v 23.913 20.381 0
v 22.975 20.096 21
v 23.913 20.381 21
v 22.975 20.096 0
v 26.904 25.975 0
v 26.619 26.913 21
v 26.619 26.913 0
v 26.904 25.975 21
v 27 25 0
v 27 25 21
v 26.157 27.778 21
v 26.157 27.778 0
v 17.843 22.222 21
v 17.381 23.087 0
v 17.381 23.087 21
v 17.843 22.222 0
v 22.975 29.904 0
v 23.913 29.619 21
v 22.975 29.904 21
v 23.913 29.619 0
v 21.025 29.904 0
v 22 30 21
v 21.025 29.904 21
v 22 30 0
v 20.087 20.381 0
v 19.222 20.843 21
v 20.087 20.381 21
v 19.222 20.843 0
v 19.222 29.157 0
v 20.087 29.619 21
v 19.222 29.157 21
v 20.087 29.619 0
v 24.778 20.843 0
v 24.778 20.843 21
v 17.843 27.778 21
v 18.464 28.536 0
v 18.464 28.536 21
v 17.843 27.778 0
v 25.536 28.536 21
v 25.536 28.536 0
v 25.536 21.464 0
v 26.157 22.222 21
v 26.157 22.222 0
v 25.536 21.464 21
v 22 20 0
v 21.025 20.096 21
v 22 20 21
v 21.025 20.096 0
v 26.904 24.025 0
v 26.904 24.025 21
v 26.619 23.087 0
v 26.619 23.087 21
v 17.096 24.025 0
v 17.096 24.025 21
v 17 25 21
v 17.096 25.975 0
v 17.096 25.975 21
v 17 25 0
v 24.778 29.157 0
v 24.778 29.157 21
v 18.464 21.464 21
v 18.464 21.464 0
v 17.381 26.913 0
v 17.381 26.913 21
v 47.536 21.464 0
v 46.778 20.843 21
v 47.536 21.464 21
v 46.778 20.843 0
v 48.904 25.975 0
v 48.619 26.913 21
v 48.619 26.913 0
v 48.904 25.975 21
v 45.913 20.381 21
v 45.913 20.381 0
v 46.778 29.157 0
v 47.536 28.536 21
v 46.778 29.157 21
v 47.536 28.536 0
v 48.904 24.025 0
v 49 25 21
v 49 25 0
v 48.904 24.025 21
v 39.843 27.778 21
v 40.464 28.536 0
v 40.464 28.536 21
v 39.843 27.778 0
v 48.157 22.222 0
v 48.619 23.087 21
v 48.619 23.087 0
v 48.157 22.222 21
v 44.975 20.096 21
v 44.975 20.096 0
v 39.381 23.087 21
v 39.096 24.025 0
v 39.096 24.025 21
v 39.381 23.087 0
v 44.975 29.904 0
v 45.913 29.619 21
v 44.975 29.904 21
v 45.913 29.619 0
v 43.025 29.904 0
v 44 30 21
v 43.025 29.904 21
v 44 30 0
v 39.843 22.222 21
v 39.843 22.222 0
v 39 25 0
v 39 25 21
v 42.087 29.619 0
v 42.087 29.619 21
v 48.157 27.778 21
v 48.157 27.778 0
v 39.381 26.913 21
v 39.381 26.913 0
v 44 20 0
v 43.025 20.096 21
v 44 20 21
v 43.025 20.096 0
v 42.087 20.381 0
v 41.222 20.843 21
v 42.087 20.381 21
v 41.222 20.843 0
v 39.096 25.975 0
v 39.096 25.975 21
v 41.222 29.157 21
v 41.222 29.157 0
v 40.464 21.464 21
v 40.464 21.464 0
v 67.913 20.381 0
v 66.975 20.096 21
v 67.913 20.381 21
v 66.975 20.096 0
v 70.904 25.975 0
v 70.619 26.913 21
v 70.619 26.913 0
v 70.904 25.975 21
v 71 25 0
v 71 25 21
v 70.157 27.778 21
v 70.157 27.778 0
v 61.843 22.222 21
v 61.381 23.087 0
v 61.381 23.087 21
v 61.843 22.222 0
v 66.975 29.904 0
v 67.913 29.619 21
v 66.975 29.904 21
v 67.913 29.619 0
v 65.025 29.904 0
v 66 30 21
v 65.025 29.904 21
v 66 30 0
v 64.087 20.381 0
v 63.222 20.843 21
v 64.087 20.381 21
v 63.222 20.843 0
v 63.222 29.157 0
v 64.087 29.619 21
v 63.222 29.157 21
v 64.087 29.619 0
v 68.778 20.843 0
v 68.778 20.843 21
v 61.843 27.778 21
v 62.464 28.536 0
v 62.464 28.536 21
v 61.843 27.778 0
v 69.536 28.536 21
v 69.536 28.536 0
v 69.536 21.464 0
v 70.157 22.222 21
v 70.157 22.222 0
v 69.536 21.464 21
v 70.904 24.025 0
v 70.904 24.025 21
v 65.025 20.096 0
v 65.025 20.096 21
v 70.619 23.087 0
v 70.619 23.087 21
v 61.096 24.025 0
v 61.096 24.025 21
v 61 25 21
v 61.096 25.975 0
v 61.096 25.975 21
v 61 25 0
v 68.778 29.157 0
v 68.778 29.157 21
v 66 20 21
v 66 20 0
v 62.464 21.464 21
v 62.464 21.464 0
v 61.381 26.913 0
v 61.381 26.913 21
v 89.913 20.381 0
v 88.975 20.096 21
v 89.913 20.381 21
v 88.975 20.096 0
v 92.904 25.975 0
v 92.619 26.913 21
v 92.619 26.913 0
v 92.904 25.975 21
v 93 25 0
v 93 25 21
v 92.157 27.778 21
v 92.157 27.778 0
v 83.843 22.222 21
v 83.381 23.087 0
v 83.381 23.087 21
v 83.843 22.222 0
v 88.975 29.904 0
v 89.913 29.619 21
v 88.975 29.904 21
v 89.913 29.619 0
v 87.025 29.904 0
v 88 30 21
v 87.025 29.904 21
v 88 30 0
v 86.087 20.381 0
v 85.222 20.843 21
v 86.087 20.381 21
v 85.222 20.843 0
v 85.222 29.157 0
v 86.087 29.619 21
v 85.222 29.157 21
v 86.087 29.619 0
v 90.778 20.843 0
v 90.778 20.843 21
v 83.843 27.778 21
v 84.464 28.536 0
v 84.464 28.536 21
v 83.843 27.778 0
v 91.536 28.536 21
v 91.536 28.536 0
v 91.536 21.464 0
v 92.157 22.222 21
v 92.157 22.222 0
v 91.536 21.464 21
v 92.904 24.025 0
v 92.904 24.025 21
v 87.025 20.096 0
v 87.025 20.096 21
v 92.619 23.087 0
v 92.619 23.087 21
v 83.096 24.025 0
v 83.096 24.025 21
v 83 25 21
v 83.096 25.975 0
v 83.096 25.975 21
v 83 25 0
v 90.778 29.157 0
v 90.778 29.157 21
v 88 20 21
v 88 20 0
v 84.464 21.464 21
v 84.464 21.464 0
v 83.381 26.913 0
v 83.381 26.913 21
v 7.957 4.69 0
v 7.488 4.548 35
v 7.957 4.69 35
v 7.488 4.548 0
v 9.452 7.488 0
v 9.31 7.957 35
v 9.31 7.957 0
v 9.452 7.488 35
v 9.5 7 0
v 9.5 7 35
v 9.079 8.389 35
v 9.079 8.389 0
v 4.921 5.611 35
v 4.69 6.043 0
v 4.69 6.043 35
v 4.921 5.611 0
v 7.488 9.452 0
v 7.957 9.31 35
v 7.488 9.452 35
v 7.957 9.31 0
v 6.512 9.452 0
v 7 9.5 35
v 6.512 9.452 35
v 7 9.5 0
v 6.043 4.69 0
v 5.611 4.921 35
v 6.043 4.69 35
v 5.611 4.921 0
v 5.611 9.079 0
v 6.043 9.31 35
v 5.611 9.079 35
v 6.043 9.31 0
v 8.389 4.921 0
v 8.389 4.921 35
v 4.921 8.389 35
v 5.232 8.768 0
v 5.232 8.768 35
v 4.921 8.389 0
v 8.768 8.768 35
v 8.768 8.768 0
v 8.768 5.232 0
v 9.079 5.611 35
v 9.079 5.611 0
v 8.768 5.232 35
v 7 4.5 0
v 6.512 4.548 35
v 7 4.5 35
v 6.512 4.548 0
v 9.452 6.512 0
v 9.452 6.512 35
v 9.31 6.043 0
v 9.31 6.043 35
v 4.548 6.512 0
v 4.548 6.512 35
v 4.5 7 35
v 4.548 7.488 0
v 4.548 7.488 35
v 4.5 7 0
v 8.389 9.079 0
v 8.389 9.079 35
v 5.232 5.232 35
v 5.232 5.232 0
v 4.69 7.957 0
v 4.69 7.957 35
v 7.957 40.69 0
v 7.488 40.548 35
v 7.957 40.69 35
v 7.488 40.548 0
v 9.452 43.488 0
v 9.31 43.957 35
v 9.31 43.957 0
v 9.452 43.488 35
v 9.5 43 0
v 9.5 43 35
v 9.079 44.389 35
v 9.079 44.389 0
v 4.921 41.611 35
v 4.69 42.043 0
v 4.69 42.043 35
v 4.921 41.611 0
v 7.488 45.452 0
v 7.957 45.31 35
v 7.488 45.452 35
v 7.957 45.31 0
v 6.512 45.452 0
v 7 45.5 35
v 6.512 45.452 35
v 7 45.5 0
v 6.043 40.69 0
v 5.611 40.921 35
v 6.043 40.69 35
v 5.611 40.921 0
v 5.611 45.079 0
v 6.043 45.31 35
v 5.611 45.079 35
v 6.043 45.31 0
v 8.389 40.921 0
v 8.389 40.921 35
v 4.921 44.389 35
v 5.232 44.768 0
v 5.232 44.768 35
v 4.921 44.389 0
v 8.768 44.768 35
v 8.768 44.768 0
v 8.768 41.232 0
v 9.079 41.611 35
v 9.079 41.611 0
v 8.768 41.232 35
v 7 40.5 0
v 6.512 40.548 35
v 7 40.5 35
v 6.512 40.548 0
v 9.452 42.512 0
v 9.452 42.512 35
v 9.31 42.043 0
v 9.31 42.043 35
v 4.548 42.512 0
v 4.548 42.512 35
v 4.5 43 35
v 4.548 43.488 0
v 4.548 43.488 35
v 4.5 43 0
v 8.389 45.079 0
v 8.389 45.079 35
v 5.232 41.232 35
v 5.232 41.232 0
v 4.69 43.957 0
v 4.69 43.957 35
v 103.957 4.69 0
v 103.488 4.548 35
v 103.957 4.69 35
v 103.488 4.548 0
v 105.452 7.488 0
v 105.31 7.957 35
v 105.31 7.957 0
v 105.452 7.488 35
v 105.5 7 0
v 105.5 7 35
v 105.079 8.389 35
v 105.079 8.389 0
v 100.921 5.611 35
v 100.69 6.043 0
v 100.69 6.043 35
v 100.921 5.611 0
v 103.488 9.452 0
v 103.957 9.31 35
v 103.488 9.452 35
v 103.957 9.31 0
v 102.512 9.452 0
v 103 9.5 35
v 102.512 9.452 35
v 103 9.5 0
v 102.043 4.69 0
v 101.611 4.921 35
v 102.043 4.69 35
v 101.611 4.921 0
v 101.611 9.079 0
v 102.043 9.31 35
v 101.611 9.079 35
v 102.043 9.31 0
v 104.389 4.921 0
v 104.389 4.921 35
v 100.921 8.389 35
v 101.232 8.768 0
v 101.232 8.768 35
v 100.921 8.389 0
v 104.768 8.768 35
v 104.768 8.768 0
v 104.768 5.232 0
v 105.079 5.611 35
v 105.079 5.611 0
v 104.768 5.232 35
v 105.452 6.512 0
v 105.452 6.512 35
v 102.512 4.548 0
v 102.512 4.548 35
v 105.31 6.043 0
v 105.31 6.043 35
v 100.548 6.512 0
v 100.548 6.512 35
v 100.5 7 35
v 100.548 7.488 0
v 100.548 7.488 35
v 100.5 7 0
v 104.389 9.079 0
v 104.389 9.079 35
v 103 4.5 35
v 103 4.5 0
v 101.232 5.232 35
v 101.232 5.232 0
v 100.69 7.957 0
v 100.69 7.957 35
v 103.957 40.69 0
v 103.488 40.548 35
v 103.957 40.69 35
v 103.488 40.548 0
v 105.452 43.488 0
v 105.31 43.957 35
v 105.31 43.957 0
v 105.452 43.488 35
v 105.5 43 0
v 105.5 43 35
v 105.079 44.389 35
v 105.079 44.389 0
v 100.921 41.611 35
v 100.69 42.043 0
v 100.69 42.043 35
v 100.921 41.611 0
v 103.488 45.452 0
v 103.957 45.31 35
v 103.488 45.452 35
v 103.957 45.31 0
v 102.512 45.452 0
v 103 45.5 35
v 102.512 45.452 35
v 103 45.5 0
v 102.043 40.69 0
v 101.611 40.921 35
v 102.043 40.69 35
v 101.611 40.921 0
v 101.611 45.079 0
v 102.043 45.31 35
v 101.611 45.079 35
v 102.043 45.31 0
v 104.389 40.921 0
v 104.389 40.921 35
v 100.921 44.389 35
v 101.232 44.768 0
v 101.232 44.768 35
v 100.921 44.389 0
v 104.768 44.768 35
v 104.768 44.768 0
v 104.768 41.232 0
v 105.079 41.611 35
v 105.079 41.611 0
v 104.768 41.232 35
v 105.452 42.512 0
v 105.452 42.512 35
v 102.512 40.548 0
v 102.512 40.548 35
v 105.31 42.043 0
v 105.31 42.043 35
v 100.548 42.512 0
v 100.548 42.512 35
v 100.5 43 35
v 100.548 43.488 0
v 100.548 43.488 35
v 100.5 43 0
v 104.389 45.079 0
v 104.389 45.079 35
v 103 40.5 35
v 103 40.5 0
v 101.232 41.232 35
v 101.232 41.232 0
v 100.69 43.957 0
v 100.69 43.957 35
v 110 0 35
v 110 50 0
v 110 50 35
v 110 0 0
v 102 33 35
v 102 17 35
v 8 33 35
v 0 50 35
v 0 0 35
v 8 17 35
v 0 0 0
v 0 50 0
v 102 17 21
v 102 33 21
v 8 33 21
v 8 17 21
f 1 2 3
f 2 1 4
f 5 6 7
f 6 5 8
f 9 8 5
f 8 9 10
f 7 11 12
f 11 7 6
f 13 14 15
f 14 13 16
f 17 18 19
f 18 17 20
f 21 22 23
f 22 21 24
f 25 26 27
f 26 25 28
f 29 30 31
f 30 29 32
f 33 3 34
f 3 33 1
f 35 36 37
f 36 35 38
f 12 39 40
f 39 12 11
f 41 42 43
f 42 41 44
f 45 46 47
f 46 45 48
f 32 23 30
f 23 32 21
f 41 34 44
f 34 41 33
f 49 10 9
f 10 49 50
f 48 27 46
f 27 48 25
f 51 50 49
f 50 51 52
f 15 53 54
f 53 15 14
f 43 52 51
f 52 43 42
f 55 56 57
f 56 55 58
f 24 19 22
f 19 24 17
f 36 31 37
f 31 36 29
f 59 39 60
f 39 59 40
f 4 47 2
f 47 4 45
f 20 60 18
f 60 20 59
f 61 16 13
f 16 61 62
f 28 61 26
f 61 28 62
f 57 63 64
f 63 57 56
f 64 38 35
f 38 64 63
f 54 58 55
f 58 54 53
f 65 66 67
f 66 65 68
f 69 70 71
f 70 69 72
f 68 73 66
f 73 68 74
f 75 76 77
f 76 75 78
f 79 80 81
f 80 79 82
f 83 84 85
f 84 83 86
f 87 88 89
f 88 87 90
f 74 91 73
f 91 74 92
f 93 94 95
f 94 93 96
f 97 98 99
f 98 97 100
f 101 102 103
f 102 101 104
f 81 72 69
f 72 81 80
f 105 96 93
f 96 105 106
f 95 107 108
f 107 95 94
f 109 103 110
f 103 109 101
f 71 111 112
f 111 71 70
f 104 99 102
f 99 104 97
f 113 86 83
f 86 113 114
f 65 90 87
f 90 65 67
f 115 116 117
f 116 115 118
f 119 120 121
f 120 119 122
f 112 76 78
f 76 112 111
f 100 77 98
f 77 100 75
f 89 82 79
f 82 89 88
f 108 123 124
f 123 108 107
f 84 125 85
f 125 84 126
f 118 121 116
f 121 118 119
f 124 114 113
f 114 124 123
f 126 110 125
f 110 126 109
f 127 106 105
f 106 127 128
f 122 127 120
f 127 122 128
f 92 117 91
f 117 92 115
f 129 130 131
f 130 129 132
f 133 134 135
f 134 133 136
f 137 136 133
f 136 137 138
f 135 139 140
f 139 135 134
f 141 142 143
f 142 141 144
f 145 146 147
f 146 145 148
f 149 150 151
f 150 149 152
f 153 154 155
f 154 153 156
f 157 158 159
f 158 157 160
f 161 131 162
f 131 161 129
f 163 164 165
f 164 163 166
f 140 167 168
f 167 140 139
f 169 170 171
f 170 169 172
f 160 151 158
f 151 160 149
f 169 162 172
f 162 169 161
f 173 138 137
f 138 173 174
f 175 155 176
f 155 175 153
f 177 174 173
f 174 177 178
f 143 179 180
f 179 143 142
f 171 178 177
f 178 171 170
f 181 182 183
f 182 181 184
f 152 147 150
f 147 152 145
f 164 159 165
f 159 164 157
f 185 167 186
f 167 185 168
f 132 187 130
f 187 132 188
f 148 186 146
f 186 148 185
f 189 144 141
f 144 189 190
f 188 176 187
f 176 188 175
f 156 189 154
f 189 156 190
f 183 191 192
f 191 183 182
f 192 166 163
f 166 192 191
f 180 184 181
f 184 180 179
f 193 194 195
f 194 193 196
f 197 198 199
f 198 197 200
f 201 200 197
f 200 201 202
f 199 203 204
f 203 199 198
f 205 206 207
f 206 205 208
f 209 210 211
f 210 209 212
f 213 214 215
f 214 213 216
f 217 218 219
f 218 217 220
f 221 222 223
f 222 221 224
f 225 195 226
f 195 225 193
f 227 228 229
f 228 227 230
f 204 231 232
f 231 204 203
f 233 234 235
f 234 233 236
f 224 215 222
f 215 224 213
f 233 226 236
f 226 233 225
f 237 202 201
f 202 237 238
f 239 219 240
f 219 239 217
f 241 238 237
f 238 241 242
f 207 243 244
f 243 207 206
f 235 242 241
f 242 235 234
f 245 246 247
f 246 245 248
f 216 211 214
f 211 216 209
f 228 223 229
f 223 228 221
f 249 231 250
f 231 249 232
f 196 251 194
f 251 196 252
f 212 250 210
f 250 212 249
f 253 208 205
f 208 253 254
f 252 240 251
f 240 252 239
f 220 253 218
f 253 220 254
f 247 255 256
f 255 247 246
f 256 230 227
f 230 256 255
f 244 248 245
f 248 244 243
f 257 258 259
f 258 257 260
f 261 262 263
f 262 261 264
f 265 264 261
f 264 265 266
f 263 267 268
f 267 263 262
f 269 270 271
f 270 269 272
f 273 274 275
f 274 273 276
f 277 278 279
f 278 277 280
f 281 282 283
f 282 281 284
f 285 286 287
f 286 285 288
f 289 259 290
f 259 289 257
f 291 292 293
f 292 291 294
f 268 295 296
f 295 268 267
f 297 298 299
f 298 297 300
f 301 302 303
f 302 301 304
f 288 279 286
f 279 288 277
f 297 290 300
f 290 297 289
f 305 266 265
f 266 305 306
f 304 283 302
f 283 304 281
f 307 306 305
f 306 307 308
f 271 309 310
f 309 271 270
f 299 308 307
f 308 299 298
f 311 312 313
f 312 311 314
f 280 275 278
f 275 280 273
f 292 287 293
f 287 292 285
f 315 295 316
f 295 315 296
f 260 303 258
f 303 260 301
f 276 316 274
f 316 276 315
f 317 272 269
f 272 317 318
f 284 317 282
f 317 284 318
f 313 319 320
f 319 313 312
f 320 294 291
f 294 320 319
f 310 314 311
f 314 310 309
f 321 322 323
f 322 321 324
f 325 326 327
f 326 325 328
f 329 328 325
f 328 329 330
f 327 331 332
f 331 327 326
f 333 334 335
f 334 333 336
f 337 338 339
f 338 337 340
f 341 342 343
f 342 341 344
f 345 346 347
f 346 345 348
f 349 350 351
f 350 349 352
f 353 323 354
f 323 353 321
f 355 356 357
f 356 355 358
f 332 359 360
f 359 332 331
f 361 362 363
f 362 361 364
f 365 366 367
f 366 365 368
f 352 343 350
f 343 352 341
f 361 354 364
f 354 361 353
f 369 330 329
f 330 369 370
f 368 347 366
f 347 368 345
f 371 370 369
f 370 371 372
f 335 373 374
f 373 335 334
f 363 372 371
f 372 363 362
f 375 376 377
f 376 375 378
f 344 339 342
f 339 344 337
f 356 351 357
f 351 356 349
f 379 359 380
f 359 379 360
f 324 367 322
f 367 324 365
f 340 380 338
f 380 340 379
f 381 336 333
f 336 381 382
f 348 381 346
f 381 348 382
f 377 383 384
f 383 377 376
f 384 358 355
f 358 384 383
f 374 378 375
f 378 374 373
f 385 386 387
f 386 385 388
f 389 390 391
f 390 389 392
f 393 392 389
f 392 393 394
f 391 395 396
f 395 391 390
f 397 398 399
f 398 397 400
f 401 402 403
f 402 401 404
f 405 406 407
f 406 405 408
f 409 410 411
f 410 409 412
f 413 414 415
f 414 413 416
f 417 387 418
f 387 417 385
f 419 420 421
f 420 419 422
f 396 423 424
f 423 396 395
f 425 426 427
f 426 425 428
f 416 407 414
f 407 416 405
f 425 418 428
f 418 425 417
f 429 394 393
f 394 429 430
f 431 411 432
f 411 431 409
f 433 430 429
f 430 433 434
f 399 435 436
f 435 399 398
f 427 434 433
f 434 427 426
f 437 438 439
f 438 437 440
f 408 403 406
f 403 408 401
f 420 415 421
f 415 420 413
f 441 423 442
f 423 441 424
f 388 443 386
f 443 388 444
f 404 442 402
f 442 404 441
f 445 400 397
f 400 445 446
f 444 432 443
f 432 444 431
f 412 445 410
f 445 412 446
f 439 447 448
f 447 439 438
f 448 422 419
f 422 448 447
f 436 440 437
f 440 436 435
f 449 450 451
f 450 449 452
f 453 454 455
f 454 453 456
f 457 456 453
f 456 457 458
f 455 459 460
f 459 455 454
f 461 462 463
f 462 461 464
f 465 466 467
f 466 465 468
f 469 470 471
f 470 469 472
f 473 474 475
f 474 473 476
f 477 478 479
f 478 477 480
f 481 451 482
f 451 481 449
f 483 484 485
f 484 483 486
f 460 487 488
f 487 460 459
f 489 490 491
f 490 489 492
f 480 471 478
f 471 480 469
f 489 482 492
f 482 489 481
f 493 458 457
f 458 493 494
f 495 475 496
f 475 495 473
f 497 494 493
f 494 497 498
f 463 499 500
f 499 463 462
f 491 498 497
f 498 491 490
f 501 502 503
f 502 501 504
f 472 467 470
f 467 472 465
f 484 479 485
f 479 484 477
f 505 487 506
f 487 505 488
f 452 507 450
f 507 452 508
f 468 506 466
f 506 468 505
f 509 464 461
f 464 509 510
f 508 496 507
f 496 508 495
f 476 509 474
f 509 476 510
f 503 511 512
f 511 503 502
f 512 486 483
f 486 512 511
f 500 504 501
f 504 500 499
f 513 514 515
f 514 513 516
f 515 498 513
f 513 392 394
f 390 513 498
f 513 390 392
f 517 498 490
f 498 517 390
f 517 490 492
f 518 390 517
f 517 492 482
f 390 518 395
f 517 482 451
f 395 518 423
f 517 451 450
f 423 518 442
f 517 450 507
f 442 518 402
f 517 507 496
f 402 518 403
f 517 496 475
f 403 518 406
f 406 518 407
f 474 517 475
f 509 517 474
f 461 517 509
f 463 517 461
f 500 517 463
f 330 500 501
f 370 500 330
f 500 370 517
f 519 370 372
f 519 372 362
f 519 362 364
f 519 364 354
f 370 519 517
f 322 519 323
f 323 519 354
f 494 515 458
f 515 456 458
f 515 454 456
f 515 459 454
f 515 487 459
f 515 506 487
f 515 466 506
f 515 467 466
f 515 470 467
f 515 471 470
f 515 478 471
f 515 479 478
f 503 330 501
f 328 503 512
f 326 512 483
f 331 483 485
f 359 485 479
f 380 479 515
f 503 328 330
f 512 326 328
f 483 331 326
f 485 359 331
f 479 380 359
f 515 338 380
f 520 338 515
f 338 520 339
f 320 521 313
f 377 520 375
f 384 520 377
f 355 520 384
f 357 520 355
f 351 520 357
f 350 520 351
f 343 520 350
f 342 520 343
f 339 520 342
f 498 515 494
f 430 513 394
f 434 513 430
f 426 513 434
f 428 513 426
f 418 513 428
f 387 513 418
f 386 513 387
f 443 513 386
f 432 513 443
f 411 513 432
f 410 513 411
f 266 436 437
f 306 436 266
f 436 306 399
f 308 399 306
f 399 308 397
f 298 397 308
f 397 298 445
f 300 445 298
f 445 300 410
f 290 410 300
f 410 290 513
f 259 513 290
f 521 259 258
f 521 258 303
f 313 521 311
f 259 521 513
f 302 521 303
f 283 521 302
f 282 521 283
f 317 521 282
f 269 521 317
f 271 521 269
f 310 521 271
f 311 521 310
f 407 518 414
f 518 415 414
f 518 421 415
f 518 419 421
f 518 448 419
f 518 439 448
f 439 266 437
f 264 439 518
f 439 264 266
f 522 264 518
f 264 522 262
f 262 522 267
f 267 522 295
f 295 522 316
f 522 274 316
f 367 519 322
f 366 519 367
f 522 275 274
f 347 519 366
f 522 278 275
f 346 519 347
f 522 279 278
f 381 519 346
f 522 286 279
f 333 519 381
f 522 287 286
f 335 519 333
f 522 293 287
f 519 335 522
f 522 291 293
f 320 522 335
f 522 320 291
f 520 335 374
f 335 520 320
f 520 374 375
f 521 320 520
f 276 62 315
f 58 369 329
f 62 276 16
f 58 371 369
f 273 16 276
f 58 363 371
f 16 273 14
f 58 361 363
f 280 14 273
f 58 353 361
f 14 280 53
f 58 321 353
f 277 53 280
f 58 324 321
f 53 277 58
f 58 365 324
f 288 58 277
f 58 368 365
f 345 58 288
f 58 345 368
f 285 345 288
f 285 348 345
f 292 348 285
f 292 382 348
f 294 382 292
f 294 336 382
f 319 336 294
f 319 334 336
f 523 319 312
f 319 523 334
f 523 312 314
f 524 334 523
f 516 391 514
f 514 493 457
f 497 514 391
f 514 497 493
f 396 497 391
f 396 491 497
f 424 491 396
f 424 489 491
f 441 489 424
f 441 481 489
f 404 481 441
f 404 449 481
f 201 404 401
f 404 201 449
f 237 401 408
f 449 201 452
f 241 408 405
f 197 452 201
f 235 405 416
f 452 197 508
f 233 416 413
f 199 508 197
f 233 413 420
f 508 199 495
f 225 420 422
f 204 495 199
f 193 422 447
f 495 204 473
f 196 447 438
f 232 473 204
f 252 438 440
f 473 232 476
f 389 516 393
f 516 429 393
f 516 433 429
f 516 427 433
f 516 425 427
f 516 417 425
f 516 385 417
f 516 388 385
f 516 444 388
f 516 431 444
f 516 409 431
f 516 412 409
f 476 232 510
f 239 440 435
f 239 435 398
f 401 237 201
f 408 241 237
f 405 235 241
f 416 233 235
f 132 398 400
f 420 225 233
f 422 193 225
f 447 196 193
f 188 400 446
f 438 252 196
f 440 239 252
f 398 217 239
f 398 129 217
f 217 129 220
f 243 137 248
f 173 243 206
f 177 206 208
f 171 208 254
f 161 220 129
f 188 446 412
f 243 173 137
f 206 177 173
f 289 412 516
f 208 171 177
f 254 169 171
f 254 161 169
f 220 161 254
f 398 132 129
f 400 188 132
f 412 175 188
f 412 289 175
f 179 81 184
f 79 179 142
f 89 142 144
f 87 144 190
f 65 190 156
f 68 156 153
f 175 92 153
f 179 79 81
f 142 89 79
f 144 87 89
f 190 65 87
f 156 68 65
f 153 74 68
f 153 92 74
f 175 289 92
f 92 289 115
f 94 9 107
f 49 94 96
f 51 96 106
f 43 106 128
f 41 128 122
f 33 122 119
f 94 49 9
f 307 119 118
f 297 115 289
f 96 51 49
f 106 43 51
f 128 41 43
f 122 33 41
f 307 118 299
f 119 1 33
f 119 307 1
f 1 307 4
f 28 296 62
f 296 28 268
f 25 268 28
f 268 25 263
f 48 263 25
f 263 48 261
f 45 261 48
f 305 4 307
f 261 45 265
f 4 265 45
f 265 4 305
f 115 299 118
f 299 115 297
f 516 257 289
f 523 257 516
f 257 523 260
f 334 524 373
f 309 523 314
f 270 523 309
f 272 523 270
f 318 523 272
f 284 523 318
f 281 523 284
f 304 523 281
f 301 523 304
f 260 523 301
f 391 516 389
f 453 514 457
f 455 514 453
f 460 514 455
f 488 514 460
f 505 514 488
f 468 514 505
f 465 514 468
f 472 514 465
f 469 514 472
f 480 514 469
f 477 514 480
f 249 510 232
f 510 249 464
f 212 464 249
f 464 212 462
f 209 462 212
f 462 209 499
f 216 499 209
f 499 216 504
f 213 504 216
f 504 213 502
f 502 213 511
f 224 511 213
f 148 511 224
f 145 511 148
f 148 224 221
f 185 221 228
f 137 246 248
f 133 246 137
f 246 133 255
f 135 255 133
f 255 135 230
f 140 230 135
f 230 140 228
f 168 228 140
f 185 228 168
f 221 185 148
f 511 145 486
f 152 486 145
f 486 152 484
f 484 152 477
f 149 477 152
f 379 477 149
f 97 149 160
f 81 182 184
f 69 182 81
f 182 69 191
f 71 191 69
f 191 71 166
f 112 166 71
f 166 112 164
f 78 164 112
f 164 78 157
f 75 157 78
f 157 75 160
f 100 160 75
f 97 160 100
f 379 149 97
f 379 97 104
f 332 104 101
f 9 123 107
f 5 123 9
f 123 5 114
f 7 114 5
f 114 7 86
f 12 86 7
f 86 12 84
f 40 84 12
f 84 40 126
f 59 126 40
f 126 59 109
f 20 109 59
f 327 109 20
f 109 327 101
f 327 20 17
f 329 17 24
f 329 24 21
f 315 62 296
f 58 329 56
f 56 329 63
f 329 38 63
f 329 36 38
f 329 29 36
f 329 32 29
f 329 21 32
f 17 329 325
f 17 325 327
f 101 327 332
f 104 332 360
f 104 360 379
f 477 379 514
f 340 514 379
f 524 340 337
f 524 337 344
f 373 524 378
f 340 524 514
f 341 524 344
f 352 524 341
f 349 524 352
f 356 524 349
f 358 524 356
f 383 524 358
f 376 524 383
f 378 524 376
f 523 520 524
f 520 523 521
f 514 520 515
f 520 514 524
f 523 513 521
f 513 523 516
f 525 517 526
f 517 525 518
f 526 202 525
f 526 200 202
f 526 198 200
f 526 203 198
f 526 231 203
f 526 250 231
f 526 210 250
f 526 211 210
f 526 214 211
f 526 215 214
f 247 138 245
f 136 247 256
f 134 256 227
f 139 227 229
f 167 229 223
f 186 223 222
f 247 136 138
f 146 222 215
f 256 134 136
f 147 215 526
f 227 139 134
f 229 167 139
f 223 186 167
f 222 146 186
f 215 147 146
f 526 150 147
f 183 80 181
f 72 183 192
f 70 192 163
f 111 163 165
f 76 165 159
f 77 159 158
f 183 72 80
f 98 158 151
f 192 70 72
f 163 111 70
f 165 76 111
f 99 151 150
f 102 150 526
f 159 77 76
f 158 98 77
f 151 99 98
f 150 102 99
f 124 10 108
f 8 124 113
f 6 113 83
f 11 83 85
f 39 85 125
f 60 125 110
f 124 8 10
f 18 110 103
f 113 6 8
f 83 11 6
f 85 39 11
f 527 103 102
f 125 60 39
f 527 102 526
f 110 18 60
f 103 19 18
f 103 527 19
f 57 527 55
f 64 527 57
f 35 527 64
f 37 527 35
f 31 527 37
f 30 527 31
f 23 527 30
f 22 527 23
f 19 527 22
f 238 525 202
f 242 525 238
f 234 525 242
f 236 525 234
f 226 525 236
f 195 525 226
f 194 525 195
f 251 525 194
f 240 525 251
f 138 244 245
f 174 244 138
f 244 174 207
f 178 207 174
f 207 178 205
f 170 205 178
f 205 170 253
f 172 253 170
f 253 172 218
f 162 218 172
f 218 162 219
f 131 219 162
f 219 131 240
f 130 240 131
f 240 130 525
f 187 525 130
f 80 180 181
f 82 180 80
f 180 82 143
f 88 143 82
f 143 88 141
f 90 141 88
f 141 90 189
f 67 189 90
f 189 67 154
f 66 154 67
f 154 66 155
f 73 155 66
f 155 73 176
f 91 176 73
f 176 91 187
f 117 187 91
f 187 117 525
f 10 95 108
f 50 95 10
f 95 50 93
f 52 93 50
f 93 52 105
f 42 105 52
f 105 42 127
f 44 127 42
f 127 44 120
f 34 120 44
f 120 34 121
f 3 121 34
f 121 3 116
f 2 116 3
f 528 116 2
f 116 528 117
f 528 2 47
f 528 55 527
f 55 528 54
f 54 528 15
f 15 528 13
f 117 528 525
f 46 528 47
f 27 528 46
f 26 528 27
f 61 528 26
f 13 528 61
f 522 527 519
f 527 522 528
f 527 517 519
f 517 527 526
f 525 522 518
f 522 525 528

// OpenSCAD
$fn = 32;

// ----------------------------------------------------------------------
// Manifold block: gallery_top manifold
// ----------------------------------------------------------------------

// --- parameters (mm) ---
block_l = 110;            // block length, X
block_w = 50;             // block width, Y
block_h = 35;             // block height, Z
port_d = 10;              // port bore diameter
port_pitch = 22;          // port pitch along X
gallery_d = 16;           // top gallery width, Y
gallery_depth = 14;       // gallery pocket depth
wall_p = 8;               // gallery end wall thickness, X
mnt_d = 5;                // mounting hole diameter
mnt_in = 7;               // mounting hole inset from the edges
fit_tol = 0.1;            // tolerance for press fits, mm
free_tol = 0.5;           // tolerance for clearance fits, mm

n_ports = 4;  // ports in the row
port_x0 = (block_l - (n_ports - 1) * port_pitch) / 2;  // first port X

difference() {
  cube([block_l, block_w, block_h]);
  for (i = [0 : n_ports - 1])
    translate([port_x0 + i * port_pitch, block_w / 2, -1])
      cylinder(h = block_h + 2, d = port_d);
  translate([wall_p, block_w / 2 - gallery_d / 2, block_h - gallery_depth])
    cube([block_l - 2 * wall_p, gallery_d, gallery_depth + 1]);
  for (cx = [mnt_in, block_l - mnt_in])
    for (cy = [mnt_in, block_w - mnt_in])
      translate([cx, cy, -1]) cylinder(h = block_h + 2, d = mnt_d);
}
